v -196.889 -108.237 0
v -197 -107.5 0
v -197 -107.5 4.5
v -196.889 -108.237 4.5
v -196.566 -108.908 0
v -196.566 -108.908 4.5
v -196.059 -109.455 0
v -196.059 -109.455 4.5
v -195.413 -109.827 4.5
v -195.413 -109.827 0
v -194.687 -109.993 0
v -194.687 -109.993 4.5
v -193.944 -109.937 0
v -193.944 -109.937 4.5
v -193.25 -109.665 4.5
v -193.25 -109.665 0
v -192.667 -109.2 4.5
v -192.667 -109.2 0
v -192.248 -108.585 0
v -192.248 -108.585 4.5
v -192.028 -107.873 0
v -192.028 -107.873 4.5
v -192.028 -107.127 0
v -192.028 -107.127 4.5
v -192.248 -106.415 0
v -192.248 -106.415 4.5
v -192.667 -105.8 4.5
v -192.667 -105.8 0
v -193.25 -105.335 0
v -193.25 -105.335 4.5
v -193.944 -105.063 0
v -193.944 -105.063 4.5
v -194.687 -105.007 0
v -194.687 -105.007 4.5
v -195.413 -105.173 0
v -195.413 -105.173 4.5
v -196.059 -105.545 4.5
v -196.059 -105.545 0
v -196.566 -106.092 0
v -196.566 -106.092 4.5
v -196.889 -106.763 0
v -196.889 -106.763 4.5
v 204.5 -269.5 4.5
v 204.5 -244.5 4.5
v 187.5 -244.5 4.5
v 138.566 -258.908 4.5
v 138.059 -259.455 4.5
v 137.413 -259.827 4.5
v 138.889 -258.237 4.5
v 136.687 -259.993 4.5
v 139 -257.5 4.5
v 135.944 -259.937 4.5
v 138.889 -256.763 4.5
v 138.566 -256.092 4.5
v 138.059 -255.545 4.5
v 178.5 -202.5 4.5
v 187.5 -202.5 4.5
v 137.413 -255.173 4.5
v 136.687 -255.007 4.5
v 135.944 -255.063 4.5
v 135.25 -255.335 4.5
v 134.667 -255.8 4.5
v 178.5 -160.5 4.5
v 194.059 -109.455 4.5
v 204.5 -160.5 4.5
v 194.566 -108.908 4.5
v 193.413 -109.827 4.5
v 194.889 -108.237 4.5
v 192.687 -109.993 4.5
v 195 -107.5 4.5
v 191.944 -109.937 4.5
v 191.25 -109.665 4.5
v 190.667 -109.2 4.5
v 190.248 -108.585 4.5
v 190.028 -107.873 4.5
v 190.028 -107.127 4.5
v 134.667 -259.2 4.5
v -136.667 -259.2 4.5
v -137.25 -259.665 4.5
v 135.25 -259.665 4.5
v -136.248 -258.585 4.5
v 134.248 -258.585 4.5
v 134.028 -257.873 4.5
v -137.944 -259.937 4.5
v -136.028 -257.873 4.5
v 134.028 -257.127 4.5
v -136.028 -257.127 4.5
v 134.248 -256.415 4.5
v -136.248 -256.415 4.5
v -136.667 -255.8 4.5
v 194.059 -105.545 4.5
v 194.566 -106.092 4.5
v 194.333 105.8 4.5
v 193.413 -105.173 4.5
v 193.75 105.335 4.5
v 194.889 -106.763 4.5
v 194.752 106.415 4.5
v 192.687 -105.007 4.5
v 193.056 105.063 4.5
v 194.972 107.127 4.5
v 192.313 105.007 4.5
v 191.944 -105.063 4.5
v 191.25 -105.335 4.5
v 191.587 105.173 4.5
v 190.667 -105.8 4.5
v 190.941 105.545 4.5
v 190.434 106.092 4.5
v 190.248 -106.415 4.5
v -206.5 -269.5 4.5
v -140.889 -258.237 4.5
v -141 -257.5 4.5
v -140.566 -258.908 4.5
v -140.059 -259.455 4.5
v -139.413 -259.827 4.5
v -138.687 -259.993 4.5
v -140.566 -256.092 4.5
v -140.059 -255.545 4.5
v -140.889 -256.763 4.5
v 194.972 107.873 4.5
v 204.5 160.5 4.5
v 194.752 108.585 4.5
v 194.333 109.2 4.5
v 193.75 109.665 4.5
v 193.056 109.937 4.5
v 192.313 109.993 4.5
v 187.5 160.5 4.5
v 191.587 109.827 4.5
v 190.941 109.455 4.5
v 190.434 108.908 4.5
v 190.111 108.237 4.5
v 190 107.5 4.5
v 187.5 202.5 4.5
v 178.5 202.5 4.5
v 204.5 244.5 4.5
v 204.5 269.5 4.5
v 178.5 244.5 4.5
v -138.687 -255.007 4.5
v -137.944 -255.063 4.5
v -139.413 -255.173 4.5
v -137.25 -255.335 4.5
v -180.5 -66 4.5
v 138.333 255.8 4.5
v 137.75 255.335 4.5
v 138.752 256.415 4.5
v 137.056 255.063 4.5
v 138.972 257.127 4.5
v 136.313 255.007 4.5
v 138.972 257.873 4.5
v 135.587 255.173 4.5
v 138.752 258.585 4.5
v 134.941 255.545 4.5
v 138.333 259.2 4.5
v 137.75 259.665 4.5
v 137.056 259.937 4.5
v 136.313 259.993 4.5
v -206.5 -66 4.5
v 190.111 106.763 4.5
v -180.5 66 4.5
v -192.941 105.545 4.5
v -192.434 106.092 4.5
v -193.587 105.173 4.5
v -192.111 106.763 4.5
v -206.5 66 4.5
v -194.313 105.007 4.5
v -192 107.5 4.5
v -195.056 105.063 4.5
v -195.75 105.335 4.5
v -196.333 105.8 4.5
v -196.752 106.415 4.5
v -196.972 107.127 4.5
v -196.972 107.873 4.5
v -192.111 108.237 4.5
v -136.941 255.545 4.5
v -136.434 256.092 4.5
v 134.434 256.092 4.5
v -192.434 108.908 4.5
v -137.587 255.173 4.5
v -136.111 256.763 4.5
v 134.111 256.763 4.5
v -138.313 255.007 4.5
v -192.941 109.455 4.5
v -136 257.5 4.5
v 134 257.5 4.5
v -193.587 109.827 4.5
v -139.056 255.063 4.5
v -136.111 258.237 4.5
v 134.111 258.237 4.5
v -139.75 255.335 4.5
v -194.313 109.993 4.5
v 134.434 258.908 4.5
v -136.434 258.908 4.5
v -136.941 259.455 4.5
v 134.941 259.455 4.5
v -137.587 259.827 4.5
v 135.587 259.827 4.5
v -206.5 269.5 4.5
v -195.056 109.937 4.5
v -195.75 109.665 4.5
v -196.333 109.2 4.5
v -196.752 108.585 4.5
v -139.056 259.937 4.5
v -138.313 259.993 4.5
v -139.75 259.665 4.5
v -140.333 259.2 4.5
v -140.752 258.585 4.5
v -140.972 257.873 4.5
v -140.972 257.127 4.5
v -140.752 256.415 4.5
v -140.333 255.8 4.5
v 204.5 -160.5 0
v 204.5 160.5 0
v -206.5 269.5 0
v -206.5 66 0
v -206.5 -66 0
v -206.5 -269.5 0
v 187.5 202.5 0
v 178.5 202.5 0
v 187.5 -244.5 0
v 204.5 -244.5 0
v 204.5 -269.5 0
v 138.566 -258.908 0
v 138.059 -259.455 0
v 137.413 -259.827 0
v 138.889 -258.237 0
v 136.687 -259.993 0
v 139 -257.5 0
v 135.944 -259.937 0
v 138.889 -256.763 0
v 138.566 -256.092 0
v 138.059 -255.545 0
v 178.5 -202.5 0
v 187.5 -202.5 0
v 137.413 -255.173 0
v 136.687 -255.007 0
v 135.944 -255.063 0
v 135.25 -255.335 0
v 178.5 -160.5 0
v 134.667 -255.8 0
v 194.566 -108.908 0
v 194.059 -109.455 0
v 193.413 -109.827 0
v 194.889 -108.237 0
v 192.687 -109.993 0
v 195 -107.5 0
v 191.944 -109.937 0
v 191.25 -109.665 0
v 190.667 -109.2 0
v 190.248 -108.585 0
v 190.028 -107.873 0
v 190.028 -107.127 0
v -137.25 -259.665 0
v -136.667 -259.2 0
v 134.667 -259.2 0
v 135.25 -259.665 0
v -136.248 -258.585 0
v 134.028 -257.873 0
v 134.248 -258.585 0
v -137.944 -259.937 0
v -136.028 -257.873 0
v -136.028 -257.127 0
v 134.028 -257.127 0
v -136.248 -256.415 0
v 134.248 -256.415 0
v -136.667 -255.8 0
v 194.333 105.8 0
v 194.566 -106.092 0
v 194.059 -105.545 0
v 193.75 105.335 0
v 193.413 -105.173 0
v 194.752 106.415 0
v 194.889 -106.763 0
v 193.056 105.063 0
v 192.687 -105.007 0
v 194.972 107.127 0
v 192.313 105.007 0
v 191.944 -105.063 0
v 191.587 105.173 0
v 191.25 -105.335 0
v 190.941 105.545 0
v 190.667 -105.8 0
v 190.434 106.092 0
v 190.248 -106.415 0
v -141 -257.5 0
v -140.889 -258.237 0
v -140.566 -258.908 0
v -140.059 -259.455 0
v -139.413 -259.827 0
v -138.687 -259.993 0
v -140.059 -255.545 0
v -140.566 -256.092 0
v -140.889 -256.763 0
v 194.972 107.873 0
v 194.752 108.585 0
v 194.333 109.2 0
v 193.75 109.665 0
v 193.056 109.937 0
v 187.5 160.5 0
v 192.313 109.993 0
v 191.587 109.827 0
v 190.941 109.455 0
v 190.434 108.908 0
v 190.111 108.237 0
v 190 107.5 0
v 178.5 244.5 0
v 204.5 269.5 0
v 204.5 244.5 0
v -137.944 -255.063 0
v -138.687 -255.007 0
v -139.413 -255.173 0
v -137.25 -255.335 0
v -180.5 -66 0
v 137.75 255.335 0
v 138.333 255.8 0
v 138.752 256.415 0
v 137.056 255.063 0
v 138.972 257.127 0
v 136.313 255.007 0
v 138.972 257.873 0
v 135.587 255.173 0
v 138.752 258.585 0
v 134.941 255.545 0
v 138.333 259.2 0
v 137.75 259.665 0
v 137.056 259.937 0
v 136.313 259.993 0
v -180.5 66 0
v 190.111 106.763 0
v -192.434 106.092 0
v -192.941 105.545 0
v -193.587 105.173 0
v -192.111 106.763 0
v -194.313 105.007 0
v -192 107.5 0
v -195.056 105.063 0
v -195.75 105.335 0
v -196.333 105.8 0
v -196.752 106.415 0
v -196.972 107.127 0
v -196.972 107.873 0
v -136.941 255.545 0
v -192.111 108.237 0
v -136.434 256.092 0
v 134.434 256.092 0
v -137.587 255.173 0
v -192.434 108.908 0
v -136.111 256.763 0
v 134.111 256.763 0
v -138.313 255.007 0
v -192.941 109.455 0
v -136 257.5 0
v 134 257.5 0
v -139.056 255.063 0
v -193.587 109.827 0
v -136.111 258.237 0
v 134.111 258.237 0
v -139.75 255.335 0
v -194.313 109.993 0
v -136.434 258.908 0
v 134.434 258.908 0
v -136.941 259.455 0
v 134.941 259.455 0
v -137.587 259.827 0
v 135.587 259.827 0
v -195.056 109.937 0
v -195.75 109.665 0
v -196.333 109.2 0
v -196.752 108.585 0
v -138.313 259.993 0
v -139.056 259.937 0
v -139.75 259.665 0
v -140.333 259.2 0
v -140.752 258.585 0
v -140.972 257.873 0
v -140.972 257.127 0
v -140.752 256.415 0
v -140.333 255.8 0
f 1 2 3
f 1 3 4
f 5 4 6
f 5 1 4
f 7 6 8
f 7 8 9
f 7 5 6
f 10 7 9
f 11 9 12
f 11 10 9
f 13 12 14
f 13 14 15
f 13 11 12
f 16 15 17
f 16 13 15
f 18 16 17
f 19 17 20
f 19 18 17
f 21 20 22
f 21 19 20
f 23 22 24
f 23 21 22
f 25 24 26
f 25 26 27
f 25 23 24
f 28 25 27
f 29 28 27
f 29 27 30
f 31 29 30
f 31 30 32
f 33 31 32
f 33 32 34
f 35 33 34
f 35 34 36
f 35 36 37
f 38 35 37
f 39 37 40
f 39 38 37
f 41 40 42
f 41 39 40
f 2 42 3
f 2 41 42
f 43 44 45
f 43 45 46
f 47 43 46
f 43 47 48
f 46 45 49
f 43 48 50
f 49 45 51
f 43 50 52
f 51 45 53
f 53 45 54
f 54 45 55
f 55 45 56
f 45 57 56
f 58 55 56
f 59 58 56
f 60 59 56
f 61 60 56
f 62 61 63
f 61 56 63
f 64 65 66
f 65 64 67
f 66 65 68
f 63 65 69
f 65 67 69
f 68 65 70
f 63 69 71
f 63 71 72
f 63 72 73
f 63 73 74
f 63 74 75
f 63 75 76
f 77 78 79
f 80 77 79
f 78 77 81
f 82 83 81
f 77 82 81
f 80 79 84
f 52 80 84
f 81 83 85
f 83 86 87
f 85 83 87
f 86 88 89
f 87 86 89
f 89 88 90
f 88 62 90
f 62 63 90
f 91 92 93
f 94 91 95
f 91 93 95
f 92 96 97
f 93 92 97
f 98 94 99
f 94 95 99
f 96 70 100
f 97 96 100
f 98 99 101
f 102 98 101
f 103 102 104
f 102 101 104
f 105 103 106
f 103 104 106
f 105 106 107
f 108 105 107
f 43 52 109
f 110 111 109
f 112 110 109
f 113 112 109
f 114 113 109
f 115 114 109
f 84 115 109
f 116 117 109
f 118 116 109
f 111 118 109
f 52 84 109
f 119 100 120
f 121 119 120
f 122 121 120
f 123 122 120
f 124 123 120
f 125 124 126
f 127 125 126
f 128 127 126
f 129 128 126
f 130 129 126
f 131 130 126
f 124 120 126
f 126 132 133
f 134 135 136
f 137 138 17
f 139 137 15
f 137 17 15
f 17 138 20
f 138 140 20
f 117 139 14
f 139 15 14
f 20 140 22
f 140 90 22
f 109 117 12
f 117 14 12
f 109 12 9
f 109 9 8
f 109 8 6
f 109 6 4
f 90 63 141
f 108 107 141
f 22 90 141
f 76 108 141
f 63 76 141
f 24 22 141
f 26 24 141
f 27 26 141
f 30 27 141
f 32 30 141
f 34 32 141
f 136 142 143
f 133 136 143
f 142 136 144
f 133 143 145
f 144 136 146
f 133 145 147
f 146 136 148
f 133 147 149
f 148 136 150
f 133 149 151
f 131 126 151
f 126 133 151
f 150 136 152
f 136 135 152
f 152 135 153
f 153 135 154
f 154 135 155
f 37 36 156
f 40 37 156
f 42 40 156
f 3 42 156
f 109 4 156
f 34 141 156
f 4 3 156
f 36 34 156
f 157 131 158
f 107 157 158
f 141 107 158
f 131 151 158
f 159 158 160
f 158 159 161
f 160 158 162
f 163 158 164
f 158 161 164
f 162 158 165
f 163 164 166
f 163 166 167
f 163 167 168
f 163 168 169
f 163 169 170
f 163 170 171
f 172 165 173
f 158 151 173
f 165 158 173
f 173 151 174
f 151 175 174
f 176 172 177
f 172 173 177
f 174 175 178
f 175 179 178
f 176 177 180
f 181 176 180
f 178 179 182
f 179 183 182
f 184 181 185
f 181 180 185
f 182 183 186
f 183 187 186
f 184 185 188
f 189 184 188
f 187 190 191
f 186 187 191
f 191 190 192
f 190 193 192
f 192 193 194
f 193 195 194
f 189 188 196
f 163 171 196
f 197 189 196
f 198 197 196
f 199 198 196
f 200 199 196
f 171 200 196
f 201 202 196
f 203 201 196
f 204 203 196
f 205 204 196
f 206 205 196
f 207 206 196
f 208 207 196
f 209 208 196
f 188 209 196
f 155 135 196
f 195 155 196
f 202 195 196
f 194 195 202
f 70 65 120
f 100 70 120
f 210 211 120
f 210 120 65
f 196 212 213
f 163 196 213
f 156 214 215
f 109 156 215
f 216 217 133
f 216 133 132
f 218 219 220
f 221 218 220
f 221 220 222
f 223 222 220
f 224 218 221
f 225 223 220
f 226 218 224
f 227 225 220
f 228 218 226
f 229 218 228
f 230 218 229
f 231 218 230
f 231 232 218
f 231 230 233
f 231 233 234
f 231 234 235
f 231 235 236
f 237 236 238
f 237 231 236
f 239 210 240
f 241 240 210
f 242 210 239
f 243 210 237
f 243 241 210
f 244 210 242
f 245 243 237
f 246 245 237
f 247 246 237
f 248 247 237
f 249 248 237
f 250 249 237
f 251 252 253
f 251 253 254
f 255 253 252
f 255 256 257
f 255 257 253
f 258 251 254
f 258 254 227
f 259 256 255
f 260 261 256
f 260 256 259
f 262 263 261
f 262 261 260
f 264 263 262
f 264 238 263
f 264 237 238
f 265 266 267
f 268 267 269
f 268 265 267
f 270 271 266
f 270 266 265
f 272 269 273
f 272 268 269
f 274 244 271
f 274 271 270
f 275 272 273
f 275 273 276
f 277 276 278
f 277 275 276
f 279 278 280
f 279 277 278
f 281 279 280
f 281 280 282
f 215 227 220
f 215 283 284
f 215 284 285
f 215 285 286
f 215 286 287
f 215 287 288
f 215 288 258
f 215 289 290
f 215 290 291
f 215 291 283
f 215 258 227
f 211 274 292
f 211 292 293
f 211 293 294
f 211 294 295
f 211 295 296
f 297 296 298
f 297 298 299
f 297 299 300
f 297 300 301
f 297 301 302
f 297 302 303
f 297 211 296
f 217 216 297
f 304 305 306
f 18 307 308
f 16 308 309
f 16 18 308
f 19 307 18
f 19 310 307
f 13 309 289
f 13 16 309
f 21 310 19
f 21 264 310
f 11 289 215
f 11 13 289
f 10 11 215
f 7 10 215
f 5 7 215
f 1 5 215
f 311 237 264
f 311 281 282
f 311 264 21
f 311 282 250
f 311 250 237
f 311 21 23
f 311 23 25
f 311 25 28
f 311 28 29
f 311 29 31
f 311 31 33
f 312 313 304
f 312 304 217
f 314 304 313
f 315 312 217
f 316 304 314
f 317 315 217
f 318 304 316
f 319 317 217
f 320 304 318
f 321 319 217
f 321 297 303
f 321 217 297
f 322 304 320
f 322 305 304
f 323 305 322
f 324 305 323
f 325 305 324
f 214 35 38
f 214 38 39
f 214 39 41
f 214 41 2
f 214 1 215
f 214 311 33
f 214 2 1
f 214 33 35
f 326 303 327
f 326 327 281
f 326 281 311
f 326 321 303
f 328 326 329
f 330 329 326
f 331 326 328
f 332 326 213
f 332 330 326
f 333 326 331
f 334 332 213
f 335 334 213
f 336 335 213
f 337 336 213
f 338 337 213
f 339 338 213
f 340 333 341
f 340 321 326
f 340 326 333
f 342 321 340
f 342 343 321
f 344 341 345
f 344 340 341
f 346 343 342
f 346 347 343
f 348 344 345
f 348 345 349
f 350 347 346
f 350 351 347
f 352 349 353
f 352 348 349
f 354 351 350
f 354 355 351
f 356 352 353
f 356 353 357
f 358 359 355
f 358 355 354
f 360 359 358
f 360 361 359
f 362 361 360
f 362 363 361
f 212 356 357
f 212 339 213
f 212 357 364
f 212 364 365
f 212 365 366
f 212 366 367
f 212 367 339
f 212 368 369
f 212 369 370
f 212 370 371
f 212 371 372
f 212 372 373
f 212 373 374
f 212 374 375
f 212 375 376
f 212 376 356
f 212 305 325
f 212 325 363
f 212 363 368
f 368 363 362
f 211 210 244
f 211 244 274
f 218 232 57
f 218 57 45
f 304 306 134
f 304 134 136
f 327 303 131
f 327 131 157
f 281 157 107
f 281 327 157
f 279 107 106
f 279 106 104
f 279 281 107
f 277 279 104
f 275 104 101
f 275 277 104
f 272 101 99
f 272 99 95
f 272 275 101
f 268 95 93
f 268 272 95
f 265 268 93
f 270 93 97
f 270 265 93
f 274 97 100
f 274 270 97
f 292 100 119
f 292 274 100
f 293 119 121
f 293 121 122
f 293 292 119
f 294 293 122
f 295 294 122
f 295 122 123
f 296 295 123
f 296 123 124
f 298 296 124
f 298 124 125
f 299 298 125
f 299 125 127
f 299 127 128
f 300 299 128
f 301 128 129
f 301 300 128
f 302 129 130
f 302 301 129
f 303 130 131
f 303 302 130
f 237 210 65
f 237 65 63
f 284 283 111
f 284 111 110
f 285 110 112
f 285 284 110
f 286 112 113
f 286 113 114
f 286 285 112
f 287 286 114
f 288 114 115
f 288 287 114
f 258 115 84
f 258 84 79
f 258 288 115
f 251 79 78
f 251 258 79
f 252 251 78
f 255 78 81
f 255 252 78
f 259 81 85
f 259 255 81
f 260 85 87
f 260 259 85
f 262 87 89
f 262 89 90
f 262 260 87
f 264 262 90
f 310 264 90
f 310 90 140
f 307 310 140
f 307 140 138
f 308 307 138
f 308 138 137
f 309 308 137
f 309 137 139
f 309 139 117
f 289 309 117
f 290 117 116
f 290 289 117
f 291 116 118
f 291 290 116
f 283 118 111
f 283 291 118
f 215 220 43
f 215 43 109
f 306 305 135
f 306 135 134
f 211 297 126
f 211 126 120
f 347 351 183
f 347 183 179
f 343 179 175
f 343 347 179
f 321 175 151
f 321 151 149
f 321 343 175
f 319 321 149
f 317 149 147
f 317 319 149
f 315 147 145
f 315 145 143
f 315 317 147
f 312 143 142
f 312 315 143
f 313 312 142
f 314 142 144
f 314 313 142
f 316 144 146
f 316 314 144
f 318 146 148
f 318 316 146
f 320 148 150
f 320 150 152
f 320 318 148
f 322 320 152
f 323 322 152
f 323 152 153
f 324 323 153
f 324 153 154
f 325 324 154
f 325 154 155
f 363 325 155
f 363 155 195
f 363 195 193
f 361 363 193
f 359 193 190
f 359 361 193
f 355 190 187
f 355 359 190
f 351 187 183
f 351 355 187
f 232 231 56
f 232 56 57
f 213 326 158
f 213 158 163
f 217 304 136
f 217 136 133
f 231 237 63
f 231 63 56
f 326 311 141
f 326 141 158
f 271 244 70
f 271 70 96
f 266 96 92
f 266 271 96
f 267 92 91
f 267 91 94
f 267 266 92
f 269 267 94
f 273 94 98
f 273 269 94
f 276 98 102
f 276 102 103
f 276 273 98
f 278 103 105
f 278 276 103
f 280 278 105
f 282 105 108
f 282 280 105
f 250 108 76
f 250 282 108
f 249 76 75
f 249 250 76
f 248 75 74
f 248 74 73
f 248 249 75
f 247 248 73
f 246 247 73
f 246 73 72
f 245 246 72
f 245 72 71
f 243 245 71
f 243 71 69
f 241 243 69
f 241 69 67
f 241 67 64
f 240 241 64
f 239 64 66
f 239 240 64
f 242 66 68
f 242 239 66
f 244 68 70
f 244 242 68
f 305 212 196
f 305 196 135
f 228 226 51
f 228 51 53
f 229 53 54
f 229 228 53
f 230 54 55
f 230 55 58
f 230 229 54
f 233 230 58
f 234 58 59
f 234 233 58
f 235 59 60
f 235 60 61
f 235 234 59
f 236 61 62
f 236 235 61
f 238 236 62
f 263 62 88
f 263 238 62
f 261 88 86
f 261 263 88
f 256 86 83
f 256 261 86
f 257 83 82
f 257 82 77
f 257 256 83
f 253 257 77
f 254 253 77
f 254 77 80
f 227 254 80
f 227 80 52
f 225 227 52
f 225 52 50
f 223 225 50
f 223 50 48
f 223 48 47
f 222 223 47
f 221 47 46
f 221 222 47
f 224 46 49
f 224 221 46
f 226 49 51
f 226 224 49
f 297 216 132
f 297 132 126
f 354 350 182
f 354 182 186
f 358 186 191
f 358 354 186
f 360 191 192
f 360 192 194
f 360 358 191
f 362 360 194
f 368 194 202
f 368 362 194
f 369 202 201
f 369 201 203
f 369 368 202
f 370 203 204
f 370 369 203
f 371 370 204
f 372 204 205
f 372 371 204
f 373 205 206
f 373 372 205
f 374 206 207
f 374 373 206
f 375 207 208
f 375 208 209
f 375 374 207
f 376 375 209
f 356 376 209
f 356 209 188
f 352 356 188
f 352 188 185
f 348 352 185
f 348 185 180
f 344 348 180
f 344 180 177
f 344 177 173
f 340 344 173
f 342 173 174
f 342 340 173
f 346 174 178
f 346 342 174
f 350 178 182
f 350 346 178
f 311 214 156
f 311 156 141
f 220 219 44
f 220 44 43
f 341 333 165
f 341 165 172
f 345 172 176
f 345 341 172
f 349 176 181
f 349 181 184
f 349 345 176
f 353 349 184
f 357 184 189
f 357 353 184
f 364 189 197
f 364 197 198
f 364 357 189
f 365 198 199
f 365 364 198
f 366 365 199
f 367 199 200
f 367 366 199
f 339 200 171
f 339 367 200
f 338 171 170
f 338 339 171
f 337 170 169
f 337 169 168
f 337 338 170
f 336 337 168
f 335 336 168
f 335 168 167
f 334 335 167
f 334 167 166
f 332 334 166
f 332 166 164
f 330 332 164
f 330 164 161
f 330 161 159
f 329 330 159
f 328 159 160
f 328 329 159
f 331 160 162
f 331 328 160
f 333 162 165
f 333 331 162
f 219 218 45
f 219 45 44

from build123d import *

# Parameters (mm, degrees)
SKETCH1_R           = 2.5
BOSS_EXTRUDE1_DEPTH = 4.5


with BuildPart() as part:
    # Sketch1 → Boss-Extrude1 (new body)
    with BuildSketch(Plane.XY):
        Polygon((-206.5, 269.5), (204.5, 269.5), (204.5, 244.5), (178.5, 244.5), (178.5, 202.5), (187.5, 202.5), (187.5, 160.5), (204.5, 160.5), (204.5, -160.5), (178.5, -160.5), (178.5, -202.5), (187.5, -202.5), (187.5, -244.5), (204.5, -244.5), (204.5, -269.5), (-206.5, -269.5), (-206.5, -244.5), (-206.5, -160.5), (-206.5, -66), (-180.5, -66), (-180.5, 66), (-206.5, 66), (-206.5, 160.5), (-206.5, 244.5), align=None)
        with Locations((136.5, -257.5)):
            Circle(SKETCH1_R, mode=Mode.SUBTRACT)
        with Locations(Location((-138.5, -257.5, 0), (0, 0, 180))):
            Circle(SKETCH1_R, mode=Mode.SUBTRACT)
        with Locations((-138.5, 257.5)):
            Circle(SKETCH1_R, mode=Mode.SUBTRACT)
        with Locations(Location((136.5, 257.5, 0), (0, 0, 180))):
            Circle(SKETCH1_R, mode=Mode.SUBTRACT)
        with Locations((-194.5, 107.5)):
            Circle(SKETCH1_R, mode=Mode.SUBTRACT)
        with Locations(Location((-194.5, -107.5, 0), (0, 0, 180))):
            Circle(SKETCH1_R, mode=Mode.SUBTRACT)
        with Locations(Location((192.5, 107.5, 0), (0, 0, 180))):
            Circle(SKETCH1_R, mode=Mode.SUBTRACT)
        with Locations((192.5, -107.5)):
            Circle(SKETCH1_R, mode=Mode.SUBTRACT)
    extrude(amount=BOSS_EXTRUDE1_DEPTH)


solid = part.part
